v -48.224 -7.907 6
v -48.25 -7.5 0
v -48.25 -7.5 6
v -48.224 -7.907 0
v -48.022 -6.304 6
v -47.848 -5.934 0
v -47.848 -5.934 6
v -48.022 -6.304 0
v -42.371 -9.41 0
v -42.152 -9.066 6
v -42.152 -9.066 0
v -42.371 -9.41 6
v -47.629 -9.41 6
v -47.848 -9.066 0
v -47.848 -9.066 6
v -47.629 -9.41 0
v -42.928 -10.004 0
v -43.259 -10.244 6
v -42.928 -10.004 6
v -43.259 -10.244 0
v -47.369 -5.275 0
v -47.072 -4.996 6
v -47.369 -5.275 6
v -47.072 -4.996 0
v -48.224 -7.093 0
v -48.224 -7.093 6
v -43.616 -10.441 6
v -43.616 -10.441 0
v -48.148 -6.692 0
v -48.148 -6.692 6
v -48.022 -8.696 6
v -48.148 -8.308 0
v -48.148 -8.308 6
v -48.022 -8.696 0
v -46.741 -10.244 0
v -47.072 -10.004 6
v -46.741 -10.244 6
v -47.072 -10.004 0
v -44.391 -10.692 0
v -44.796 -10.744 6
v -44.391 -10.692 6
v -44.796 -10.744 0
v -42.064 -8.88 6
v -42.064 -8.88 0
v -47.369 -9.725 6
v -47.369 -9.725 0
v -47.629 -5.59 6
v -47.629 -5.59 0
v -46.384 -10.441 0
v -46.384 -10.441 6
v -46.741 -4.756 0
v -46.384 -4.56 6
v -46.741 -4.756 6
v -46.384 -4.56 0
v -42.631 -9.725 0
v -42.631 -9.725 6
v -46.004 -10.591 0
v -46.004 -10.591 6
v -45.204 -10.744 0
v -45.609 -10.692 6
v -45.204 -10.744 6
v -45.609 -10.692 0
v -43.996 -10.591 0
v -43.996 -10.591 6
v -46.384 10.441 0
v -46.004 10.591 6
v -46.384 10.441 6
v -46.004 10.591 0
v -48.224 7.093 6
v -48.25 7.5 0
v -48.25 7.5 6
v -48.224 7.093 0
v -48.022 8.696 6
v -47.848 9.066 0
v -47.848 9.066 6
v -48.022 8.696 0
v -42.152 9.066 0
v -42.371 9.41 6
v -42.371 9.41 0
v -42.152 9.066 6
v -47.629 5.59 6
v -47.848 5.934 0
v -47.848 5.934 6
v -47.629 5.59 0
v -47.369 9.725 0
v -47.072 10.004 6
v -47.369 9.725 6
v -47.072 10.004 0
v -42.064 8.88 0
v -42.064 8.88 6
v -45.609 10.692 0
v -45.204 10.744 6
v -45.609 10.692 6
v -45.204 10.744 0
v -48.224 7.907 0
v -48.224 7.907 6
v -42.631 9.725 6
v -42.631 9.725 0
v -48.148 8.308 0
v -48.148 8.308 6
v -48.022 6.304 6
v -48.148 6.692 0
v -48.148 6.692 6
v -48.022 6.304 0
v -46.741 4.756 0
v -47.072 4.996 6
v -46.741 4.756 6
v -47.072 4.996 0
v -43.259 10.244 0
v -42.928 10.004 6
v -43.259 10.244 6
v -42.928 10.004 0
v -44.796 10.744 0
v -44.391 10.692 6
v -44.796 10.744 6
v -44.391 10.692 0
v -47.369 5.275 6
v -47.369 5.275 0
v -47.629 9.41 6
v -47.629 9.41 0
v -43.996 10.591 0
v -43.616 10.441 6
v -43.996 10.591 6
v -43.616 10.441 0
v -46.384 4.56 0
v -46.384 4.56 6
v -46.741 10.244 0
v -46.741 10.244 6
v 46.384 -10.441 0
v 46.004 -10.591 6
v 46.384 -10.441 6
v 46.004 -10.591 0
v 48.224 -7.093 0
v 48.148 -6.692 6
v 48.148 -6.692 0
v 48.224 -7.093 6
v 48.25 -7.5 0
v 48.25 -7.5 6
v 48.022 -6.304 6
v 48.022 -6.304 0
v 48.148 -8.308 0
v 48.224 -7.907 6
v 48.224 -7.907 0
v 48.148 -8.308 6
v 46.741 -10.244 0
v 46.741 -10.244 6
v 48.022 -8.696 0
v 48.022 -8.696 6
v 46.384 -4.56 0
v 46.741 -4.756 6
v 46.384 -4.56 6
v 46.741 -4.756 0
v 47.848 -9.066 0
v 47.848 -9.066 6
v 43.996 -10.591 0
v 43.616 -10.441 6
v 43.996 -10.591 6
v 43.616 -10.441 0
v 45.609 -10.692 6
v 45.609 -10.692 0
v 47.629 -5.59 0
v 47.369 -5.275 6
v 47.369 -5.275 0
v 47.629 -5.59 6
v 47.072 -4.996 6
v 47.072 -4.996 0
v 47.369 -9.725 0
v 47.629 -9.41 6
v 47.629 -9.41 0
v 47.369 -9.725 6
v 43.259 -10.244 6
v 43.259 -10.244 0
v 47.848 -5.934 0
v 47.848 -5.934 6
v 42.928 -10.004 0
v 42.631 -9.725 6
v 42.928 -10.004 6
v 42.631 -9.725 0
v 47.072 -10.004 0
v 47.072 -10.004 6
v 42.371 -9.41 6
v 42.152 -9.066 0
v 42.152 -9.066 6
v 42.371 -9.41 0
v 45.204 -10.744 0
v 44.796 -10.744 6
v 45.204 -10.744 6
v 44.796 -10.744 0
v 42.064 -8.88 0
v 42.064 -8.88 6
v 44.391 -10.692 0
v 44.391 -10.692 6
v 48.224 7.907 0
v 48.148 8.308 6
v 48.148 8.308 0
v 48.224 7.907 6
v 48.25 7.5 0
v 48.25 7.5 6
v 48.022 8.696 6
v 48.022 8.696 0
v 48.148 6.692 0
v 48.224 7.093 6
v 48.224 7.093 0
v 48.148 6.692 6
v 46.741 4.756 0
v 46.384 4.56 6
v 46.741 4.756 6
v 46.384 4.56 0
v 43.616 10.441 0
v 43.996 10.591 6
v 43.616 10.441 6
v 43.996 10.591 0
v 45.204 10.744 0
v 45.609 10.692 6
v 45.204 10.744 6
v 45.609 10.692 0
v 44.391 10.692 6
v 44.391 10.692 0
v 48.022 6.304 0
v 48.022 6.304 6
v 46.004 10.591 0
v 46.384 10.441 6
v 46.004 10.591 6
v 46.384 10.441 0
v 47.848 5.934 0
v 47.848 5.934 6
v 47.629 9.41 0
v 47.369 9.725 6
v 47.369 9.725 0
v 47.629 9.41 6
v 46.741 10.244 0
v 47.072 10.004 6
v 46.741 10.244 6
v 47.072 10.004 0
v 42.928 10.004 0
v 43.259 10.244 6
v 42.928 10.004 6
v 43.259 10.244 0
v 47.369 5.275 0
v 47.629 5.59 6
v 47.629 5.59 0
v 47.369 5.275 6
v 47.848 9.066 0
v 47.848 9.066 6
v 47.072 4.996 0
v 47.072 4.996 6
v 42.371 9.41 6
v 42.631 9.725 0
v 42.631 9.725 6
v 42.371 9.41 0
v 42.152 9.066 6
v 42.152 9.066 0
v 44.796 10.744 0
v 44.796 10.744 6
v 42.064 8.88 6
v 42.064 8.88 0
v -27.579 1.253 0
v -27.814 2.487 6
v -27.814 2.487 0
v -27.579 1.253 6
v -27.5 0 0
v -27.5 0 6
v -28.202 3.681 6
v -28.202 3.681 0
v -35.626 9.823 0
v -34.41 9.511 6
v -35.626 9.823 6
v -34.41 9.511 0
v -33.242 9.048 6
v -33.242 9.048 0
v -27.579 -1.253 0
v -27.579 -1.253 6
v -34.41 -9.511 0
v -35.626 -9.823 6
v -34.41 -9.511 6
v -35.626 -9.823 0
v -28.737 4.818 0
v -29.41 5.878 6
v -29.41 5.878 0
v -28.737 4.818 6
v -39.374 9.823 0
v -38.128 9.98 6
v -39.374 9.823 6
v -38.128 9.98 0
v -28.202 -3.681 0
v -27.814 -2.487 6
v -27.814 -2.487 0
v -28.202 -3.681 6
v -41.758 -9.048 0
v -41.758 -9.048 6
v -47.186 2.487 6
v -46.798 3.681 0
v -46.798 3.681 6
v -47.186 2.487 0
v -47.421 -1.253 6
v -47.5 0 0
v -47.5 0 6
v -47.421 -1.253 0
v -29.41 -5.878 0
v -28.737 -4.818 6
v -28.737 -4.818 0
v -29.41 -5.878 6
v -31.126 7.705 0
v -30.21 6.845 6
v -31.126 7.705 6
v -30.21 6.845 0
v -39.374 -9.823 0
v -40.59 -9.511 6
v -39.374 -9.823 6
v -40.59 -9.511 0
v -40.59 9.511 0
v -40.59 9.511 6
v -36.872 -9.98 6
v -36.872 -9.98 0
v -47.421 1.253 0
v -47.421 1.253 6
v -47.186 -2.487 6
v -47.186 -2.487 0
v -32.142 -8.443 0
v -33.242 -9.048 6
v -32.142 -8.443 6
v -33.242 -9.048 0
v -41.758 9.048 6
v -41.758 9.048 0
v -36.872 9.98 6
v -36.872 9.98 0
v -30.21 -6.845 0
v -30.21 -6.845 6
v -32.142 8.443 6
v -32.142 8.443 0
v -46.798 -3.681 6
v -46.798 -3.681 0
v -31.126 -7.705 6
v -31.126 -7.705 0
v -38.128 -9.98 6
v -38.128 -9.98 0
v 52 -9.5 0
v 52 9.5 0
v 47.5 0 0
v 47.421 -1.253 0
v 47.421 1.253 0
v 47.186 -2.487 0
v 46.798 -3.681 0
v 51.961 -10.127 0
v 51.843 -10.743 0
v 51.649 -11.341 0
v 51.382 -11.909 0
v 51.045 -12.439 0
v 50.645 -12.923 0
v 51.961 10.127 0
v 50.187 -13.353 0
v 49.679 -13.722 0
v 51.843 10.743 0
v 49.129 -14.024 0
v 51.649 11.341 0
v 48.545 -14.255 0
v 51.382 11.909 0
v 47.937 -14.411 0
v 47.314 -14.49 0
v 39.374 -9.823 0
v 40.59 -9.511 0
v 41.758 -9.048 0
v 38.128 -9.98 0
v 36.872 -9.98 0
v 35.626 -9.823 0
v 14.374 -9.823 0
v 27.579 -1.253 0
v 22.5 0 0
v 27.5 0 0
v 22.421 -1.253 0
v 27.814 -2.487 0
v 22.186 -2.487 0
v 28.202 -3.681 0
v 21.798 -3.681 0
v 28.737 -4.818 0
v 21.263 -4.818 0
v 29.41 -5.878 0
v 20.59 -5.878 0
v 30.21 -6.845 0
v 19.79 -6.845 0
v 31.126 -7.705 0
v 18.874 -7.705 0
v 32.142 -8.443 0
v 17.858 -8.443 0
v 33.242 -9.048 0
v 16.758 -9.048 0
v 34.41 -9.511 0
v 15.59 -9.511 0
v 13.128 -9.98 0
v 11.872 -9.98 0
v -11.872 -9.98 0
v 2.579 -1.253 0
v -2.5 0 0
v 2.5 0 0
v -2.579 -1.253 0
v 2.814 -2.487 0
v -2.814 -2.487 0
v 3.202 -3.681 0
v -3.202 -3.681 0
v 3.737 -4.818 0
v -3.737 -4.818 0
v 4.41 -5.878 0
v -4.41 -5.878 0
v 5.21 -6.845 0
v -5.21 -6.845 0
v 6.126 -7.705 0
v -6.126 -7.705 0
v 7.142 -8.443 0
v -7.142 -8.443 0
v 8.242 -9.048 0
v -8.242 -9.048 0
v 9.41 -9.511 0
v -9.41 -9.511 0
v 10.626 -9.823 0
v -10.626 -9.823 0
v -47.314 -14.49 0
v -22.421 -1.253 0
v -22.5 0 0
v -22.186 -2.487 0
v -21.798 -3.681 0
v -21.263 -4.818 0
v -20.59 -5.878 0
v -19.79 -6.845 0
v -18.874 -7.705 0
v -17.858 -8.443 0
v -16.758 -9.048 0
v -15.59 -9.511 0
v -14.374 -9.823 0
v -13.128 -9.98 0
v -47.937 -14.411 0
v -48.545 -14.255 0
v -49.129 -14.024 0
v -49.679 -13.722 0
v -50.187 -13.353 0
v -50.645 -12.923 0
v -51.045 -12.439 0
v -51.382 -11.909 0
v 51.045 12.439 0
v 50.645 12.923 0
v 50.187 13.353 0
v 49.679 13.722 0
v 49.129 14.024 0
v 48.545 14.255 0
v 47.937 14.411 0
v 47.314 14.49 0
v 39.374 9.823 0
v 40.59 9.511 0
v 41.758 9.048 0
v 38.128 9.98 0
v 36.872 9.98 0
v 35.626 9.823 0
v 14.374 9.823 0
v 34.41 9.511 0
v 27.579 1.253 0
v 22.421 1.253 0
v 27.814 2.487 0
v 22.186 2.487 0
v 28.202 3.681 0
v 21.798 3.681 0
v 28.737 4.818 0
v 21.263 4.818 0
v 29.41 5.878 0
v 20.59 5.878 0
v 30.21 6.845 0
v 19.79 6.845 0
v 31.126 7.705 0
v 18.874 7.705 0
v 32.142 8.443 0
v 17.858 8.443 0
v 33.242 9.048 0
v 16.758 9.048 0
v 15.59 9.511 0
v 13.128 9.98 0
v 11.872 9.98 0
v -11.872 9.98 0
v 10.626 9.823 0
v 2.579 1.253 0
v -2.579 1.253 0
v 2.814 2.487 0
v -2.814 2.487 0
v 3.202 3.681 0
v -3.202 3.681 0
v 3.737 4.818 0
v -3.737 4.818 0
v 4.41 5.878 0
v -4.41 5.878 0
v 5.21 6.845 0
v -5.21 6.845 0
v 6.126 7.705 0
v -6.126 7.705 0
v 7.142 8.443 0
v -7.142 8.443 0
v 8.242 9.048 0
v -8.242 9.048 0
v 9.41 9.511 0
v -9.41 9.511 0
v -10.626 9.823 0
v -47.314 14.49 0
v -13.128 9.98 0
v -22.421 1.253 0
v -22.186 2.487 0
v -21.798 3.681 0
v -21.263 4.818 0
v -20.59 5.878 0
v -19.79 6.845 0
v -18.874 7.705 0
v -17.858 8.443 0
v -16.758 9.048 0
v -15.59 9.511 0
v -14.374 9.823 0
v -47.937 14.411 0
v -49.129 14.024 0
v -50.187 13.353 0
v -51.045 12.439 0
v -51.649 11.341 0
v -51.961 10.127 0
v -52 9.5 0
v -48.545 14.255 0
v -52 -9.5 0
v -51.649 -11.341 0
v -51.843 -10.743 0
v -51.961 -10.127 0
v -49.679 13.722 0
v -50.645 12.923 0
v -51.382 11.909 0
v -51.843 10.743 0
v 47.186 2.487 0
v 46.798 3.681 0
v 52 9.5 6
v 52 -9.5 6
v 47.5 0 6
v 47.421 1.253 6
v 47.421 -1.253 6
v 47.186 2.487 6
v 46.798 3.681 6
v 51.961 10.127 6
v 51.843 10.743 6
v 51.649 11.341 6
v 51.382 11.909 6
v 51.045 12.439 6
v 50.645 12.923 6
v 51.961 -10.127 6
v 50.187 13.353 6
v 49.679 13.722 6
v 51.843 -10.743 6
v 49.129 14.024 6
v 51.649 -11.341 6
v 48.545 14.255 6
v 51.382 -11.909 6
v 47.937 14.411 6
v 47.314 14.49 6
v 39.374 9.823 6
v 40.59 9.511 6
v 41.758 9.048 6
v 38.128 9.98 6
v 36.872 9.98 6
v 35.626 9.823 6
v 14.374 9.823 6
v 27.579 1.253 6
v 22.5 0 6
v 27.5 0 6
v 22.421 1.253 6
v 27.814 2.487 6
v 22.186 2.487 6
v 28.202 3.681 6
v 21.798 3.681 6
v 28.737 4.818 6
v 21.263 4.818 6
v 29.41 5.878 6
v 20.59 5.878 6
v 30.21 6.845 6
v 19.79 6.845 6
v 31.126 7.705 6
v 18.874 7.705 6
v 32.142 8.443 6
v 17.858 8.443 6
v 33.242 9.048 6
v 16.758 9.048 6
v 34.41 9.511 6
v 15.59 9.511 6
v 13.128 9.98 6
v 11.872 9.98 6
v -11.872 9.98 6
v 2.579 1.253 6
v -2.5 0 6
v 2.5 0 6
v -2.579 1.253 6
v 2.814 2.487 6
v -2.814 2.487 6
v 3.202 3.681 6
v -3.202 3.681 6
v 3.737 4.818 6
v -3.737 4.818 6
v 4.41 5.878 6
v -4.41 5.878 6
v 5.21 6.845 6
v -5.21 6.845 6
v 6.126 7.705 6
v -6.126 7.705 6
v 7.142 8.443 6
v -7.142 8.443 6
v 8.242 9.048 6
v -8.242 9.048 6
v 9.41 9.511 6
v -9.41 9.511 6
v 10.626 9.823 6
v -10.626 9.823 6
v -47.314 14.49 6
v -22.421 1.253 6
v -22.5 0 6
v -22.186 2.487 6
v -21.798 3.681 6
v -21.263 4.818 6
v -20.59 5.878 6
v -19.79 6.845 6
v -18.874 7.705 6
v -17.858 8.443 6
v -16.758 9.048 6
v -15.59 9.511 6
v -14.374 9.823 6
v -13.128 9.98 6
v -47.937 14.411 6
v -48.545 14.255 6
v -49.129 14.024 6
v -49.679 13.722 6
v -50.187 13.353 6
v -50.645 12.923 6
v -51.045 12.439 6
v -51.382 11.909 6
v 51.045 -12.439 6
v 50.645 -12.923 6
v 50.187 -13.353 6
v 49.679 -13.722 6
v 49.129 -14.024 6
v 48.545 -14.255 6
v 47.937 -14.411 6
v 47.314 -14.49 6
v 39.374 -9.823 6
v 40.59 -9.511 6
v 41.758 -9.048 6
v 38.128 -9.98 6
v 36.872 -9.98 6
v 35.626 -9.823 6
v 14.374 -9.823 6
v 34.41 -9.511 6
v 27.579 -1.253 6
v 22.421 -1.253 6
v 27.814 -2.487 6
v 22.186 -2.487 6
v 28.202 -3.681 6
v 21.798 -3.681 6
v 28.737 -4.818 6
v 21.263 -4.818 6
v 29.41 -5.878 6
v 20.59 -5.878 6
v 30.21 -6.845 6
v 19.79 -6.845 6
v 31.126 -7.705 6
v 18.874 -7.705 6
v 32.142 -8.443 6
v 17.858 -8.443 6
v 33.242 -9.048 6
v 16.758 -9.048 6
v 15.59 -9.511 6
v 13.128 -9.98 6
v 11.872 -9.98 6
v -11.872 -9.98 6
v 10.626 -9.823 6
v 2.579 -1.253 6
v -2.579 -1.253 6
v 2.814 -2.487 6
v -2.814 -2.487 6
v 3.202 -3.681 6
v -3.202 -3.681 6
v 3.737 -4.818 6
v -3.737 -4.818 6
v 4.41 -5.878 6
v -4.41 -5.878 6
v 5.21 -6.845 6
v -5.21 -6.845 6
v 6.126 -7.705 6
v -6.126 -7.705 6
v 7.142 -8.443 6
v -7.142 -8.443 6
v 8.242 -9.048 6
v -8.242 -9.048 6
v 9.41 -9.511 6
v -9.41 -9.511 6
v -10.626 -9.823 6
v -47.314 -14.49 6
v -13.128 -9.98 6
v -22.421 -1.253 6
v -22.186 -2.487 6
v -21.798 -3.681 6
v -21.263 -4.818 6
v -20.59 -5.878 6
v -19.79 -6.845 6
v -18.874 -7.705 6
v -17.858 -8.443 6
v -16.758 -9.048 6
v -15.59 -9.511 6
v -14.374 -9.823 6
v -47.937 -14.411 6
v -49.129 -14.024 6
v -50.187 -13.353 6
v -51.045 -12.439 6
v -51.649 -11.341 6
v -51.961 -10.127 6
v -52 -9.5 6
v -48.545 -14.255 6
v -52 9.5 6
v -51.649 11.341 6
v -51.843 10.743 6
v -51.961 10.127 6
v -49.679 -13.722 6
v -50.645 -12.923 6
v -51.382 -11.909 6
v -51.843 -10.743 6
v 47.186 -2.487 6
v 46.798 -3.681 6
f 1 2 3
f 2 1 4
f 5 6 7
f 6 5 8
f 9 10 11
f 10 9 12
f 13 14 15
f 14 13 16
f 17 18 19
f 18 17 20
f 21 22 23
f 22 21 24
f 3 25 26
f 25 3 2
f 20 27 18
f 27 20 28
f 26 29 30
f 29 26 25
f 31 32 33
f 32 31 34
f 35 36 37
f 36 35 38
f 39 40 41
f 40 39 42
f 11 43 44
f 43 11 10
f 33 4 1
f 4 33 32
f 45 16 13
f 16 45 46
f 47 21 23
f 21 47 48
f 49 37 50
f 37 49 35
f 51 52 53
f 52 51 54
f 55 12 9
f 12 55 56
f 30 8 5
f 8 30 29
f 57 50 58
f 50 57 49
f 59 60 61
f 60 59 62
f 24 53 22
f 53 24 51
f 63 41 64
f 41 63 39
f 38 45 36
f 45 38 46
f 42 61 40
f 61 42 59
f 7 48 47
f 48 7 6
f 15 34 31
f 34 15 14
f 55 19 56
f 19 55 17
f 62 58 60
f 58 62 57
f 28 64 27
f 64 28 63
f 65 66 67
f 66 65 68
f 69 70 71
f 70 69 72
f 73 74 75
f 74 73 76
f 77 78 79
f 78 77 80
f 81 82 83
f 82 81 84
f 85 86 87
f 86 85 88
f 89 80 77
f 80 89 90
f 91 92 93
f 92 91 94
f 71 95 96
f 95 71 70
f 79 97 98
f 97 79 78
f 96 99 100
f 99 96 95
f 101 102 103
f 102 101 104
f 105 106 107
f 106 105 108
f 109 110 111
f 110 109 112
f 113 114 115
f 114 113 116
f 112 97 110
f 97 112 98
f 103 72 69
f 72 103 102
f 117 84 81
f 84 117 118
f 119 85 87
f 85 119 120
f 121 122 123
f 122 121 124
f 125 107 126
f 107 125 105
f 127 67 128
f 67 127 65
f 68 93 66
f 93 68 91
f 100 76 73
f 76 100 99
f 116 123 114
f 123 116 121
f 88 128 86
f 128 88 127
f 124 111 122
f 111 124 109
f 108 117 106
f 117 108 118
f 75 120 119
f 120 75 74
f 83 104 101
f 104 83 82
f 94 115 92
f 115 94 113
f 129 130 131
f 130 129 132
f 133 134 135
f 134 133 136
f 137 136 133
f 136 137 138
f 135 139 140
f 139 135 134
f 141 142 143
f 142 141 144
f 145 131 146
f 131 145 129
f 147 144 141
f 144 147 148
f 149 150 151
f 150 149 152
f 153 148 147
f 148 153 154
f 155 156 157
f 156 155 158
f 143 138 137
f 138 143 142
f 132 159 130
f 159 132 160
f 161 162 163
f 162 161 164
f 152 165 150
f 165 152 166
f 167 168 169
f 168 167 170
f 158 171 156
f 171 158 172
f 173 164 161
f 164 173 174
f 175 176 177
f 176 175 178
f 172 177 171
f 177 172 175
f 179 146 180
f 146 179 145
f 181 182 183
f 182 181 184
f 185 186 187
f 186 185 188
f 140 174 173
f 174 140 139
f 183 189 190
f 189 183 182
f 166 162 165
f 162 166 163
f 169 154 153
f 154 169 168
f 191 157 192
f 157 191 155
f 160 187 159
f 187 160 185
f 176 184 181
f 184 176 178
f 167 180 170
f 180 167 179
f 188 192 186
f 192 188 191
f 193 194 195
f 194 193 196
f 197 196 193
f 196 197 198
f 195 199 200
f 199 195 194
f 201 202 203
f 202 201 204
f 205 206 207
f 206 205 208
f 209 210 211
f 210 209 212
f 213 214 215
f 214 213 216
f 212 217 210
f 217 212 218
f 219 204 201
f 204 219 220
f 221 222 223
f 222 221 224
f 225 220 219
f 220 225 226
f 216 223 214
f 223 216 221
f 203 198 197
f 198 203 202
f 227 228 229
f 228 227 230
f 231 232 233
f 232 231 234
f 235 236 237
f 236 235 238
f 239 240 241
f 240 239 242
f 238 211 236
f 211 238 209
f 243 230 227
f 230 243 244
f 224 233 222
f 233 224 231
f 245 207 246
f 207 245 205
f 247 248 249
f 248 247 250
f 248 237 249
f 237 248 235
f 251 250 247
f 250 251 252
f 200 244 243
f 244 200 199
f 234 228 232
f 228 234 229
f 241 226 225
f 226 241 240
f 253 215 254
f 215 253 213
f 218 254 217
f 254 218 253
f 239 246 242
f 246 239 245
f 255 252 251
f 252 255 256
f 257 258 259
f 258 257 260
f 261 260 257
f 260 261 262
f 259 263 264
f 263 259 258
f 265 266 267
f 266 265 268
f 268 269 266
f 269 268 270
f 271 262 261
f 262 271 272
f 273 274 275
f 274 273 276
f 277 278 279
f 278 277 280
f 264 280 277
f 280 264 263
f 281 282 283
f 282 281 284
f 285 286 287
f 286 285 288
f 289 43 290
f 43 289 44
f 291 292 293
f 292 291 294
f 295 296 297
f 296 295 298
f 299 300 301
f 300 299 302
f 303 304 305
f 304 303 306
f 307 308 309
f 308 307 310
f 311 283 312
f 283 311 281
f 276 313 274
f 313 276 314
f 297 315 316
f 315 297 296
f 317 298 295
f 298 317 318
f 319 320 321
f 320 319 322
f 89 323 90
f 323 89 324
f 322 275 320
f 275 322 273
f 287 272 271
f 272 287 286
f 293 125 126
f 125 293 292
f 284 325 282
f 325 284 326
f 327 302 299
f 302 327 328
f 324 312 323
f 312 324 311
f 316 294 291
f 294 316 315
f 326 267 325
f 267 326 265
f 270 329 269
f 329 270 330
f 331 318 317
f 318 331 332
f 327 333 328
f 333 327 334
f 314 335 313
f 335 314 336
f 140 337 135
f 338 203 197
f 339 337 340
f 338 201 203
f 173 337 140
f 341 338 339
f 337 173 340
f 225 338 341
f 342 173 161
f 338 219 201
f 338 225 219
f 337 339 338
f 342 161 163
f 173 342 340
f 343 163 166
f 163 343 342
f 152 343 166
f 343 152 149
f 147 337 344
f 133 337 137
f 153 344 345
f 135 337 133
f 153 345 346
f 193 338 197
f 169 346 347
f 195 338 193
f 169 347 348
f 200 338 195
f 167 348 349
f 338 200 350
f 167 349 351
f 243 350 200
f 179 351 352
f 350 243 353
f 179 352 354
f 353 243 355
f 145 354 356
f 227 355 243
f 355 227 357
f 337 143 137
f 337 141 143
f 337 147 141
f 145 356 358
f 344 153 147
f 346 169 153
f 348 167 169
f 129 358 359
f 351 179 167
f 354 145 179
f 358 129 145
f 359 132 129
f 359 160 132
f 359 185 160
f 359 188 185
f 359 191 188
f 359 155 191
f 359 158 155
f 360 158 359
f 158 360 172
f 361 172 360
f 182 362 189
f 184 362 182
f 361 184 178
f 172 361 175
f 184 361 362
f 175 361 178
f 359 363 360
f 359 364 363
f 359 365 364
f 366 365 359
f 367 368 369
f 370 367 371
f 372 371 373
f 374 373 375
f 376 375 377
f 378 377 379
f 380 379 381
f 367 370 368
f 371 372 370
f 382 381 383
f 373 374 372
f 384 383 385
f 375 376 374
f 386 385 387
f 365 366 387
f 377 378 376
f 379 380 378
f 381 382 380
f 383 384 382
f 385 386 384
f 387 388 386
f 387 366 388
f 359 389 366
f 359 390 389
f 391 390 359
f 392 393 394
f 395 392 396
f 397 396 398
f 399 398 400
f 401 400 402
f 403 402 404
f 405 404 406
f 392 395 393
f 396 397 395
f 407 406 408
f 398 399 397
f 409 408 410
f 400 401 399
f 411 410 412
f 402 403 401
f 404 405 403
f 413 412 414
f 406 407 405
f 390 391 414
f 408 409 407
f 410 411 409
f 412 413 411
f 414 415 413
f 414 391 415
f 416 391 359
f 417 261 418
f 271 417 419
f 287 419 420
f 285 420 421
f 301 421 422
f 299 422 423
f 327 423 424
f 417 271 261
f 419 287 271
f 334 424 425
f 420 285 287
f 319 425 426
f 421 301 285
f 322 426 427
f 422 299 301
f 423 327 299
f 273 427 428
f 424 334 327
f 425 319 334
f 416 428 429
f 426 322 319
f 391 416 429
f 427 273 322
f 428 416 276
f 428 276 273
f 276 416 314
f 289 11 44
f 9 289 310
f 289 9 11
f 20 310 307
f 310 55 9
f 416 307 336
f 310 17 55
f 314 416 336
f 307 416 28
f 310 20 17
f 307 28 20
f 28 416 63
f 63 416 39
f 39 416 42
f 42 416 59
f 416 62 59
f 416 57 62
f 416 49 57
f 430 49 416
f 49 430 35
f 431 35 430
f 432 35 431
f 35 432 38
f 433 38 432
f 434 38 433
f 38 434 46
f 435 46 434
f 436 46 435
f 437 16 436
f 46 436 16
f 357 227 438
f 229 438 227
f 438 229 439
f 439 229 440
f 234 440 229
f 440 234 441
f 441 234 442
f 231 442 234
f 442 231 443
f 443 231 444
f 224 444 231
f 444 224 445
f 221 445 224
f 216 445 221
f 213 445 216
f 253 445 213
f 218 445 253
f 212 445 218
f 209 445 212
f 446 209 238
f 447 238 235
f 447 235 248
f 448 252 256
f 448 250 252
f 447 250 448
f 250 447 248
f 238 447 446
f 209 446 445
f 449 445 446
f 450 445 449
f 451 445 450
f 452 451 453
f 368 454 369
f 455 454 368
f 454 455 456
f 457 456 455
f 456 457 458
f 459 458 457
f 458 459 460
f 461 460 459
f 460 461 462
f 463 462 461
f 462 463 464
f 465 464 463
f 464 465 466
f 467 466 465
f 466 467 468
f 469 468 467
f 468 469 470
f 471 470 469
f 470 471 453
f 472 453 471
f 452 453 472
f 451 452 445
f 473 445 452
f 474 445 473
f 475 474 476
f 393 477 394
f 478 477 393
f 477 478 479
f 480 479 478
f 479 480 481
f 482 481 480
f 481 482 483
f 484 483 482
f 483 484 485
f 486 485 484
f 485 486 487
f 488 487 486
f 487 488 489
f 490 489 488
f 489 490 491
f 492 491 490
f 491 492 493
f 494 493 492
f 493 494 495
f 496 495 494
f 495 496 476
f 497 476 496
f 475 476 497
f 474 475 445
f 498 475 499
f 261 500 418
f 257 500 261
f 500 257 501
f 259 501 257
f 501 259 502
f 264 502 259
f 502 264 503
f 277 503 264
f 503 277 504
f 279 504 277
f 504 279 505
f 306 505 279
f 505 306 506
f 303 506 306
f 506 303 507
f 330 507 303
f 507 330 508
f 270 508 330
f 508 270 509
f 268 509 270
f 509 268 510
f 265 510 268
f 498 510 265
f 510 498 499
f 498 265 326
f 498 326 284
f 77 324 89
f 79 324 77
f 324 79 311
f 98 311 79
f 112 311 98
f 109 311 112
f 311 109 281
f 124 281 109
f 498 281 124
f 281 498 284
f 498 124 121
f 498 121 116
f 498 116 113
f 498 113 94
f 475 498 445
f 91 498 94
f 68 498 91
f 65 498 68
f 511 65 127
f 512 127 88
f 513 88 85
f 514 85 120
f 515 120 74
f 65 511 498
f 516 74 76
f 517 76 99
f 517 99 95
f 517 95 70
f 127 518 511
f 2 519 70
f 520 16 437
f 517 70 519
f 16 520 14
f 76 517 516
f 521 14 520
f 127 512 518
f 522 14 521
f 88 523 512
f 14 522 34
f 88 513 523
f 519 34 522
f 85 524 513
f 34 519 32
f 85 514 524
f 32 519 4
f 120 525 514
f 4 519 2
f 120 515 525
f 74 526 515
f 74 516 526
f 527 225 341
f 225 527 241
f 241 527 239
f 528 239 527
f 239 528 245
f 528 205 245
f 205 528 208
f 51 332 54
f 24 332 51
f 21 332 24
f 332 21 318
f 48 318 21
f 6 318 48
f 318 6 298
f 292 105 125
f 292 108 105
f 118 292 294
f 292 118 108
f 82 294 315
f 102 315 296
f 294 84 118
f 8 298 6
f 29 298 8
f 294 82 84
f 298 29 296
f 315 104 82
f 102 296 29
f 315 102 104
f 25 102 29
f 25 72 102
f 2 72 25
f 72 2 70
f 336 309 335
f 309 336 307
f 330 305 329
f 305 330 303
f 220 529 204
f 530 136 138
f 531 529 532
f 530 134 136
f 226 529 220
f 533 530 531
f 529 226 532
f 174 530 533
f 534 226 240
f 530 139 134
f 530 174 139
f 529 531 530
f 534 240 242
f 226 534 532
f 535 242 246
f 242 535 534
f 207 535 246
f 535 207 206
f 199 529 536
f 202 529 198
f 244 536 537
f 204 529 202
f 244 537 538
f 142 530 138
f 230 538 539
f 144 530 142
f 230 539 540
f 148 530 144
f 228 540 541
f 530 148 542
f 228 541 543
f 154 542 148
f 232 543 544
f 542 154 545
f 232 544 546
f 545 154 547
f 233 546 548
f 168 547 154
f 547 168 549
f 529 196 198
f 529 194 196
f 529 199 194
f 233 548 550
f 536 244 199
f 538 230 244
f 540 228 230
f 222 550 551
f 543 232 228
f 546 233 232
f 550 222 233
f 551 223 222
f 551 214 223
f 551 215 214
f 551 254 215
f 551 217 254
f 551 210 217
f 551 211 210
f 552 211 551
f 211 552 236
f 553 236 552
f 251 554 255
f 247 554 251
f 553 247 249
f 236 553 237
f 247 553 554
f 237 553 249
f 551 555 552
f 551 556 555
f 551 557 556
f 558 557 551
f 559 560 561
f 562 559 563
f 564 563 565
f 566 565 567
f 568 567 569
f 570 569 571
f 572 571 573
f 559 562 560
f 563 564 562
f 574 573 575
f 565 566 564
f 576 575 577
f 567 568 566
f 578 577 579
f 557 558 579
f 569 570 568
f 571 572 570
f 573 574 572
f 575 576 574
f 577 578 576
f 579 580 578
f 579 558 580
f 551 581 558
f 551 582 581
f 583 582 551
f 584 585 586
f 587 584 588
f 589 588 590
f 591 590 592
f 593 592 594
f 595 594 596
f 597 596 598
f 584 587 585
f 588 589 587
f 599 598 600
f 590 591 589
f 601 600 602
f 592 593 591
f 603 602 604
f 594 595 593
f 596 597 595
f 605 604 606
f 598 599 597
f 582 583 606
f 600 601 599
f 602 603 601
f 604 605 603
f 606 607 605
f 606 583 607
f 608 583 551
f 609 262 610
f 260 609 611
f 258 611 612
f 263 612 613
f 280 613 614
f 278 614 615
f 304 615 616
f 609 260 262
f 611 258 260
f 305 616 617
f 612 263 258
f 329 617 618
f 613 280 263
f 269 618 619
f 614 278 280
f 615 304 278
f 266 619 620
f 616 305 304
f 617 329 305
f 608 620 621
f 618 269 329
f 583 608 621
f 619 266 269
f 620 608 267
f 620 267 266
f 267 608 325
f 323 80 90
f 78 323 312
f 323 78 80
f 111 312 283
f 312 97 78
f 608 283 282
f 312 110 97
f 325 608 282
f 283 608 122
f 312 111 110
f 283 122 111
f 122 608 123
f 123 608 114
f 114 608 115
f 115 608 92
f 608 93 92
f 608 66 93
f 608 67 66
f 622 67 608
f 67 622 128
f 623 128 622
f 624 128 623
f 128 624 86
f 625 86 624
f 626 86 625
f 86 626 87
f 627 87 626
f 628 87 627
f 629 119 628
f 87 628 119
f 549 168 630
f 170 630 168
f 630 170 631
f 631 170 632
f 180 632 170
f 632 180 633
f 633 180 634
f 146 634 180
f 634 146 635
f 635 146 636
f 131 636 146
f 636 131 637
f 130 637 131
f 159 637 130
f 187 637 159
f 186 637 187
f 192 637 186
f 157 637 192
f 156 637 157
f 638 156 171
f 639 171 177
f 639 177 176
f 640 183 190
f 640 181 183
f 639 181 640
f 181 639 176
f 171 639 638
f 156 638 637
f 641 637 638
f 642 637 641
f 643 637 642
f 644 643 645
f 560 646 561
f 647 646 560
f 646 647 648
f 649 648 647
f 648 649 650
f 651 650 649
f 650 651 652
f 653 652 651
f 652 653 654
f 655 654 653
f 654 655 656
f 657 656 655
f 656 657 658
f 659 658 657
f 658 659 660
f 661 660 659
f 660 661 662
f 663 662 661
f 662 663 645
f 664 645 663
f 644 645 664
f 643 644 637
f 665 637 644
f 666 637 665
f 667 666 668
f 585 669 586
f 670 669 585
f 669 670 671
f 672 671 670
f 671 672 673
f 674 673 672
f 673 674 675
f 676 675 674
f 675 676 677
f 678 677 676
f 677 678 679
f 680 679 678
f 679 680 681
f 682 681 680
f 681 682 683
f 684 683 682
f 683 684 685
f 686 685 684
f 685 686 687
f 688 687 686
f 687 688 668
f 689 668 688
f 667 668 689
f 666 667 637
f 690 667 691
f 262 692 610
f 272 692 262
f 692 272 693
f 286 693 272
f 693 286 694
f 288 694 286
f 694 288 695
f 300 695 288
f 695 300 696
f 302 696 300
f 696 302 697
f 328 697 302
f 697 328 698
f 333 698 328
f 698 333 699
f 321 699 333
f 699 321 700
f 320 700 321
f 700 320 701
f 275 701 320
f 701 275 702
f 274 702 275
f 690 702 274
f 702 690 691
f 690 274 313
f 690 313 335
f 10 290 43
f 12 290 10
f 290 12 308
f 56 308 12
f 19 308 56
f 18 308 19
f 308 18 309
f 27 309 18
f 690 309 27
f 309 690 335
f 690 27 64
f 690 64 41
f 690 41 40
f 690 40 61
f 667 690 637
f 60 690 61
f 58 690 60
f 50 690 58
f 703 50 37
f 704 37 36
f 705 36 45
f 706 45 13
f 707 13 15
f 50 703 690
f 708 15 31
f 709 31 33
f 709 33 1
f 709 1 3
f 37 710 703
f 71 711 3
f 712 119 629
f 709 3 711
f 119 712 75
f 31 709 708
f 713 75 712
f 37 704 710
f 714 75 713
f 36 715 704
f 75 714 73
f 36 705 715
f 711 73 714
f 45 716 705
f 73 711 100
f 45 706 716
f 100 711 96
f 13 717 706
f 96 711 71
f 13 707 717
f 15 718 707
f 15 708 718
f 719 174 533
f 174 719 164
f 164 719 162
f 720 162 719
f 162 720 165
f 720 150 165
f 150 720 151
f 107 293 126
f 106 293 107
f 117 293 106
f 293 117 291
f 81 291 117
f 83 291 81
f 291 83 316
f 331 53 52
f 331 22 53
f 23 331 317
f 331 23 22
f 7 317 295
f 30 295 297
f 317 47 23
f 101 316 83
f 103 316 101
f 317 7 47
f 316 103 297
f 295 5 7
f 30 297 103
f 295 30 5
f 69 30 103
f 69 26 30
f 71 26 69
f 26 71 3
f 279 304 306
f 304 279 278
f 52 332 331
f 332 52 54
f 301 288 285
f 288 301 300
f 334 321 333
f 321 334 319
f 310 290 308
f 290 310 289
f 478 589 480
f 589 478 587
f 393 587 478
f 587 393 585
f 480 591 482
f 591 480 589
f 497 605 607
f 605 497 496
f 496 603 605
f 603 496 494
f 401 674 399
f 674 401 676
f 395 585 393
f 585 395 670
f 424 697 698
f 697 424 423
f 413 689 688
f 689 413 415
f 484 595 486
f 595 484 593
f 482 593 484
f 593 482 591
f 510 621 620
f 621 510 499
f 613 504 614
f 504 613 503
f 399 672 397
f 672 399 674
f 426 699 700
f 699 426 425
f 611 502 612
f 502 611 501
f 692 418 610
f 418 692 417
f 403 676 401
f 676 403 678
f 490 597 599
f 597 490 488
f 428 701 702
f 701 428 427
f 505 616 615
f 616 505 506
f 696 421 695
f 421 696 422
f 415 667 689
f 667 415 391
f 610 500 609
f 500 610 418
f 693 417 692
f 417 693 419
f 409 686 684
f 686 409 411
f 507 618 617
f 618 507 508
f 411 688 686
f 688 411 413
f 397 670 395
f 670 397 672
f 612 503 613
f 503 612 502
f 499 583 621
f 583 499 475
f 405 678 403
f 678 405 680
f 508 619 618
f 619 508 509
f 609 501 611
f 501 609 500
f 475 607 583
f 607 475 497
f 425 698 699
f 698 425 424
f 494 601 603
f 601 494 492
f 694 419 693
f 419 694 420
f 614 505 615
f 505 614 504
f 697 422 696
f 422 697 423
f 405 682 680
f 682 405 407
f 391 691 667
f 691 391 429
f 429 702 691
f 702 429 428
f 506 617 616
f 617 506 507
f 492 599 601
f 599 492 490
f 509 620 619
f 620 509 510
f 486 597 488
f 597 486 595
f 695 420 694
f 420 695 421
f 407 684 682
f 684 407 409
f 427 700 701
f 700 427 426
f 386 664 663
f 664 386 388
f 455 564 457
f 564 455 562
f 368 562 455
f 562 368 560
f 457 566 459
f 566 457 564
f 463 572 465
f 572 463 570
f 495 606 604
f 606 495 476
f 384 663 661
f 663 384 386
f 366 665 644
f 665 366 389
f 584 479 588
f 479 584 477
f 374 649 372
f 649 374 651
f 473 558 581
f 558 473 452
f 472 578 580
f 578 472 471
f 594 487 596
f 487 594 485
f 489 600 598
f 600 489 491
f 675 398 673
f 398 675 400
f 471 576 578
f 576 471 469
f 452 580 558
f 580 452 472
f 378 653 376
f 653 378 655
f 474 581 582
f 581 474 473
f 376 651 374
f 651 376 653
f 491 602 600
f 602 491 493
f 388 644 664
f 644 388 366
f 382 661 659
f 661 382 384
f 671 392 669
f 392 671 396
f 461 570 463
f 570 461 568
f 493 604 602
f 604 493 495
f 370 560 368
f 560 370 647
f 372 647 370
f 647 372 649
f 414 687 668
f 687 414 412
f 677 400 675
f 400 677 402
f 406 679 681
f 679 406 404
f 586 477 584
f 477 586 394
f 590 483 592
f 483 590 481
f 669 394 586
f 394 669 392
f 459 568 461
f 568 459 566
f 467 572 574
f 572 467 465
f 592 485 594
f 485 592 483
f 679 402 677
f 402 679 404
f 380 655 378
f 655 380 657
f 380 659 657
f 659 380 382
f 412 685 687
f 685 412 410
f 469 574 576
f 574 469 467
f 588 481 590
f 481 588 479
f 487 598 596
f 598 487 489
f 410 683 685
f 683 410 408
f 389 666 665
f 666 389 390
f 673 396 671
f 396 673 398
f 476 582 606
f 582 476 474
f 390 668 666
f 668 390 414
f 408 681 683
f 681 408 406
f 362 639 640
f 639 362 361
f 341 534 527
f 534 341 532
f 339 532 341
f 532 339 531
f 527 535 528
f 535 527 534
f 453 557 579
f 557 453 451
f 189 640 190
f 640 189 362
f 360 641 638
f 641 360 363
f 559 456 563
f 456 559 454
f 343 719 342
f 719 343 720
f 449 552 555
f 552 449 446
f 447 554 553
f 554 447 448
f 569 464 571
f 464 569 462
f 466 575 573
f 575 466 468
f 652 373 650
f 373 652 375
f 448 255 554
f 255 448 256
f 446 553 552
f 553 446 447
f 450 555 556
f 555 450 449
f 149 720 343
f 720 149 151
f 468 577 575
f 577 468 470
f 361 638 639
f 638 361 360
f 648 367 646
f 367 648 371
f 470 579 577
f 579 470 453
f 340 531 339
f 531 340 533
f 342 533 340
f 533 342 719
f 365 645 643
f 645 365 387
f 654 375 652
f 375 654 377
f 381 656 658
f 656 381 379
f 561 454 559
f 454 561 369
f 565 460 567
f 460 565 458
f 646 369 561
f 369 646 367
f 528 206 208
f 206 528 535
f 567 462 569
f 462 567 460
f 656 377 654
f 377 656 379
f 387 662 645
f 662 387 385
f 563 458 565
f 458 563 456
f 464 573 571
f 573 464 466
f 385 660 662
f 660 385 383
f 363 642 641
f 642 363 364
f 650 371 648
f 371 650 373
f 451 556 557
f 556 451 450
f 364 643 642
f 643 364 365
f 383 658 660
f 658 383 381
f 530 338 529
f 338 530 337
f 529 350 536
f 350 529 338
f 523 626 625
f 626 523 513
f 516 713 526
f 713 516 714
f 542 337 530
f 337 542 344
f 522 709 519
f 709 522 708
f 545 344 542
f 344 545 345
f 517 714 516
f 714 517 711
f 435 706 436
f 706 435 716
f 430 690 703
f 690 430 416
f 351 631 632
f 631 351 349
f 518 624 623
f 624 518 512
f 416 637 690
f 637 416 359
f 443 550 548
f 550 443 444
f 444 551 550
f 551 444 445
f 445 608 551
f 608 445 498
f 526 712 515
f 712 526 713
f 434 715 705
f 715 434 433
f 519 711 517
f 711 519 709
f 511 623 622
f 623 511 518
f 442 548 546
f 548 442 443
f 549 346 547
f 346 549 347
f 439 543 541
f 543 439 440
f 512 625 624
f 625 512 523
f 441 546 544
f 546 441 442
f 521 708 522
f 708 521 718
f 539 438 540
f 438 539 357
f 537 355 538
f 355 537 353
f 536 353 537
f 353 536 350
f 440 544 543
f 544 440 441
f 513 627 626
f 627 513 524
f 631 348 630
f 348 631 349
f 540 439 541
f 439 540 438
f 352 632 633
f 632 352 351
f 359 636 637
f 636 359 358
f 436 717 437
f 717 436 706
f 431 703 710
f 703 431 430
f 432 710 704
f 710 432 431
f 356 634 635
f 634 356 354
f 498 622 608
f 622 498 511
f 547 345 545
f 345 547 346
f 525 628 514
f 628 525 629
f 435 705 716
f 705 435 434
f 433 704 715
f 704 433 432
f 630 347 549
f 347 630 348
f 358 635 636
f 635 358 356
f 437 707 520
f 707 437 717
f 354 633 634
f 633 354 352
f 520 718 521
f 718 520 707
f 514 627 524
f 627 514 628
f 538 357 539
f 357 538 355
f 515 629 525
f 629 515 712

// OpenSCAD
$fn = 50;


difference() {
	union() {
		hull() {
			translate(v = [-47.0000000000, 9.5000000000, 0]) {
				cylinder(h = 6, r = 5);
			}
			translate(v = [47.0000000000, 9.5000000000, 0]) {
				cylinder(h = 6, r = 5);
			}
			translate(v = [-47.0000000000, -9.5000000000, 0]) {
				cylinder(h = 6, r = 5);
			}
			translate(v = [47.0000000000, -9.5000000000, 0]) {
				cylinder(h = 6, r = 5);
			}
		}
	}
	union() {
		#translate(v = [-45.0000000000, -7.5000000000, -100.0000000000]) {
			cylinder(h = 200, r = 3.2500000000);
		}
		#translate(v = [-45.0000000000, 7.5000000000, -100.0000000000]) {
			cylinder(h = 200, r = 3.2500000000);
		}
		#translate(v = [45.0000000000, -7.5000000000, -100.0000000000]) {
			cylinder(h = 200, r = 3.2500000000);
		}
		#translate(v = [45.0000000000, 7.5000000000, -100.0000000000]) {
			cylinder(h = 200, r = 3.2500000000);
		}
		#translate(v = [-37.5000000000, 0, 0]) {
			cylinder(h = 6, r = 10.0000000000);
		}
		#translate(v = [-12.5000000000, 0, 0]) {
			cylinder(h = 6, r = 10.0000000000);
		}
		#translate(v = [12.5000000000, 0, 0]) {
			cylinder(h = 6, r = 10.0000000000);
		}
		#translate(v = [37.5000000000, 0, 0]) {
			cylinder(h = 6, r = 10.0000000000);
		}
	}
}
